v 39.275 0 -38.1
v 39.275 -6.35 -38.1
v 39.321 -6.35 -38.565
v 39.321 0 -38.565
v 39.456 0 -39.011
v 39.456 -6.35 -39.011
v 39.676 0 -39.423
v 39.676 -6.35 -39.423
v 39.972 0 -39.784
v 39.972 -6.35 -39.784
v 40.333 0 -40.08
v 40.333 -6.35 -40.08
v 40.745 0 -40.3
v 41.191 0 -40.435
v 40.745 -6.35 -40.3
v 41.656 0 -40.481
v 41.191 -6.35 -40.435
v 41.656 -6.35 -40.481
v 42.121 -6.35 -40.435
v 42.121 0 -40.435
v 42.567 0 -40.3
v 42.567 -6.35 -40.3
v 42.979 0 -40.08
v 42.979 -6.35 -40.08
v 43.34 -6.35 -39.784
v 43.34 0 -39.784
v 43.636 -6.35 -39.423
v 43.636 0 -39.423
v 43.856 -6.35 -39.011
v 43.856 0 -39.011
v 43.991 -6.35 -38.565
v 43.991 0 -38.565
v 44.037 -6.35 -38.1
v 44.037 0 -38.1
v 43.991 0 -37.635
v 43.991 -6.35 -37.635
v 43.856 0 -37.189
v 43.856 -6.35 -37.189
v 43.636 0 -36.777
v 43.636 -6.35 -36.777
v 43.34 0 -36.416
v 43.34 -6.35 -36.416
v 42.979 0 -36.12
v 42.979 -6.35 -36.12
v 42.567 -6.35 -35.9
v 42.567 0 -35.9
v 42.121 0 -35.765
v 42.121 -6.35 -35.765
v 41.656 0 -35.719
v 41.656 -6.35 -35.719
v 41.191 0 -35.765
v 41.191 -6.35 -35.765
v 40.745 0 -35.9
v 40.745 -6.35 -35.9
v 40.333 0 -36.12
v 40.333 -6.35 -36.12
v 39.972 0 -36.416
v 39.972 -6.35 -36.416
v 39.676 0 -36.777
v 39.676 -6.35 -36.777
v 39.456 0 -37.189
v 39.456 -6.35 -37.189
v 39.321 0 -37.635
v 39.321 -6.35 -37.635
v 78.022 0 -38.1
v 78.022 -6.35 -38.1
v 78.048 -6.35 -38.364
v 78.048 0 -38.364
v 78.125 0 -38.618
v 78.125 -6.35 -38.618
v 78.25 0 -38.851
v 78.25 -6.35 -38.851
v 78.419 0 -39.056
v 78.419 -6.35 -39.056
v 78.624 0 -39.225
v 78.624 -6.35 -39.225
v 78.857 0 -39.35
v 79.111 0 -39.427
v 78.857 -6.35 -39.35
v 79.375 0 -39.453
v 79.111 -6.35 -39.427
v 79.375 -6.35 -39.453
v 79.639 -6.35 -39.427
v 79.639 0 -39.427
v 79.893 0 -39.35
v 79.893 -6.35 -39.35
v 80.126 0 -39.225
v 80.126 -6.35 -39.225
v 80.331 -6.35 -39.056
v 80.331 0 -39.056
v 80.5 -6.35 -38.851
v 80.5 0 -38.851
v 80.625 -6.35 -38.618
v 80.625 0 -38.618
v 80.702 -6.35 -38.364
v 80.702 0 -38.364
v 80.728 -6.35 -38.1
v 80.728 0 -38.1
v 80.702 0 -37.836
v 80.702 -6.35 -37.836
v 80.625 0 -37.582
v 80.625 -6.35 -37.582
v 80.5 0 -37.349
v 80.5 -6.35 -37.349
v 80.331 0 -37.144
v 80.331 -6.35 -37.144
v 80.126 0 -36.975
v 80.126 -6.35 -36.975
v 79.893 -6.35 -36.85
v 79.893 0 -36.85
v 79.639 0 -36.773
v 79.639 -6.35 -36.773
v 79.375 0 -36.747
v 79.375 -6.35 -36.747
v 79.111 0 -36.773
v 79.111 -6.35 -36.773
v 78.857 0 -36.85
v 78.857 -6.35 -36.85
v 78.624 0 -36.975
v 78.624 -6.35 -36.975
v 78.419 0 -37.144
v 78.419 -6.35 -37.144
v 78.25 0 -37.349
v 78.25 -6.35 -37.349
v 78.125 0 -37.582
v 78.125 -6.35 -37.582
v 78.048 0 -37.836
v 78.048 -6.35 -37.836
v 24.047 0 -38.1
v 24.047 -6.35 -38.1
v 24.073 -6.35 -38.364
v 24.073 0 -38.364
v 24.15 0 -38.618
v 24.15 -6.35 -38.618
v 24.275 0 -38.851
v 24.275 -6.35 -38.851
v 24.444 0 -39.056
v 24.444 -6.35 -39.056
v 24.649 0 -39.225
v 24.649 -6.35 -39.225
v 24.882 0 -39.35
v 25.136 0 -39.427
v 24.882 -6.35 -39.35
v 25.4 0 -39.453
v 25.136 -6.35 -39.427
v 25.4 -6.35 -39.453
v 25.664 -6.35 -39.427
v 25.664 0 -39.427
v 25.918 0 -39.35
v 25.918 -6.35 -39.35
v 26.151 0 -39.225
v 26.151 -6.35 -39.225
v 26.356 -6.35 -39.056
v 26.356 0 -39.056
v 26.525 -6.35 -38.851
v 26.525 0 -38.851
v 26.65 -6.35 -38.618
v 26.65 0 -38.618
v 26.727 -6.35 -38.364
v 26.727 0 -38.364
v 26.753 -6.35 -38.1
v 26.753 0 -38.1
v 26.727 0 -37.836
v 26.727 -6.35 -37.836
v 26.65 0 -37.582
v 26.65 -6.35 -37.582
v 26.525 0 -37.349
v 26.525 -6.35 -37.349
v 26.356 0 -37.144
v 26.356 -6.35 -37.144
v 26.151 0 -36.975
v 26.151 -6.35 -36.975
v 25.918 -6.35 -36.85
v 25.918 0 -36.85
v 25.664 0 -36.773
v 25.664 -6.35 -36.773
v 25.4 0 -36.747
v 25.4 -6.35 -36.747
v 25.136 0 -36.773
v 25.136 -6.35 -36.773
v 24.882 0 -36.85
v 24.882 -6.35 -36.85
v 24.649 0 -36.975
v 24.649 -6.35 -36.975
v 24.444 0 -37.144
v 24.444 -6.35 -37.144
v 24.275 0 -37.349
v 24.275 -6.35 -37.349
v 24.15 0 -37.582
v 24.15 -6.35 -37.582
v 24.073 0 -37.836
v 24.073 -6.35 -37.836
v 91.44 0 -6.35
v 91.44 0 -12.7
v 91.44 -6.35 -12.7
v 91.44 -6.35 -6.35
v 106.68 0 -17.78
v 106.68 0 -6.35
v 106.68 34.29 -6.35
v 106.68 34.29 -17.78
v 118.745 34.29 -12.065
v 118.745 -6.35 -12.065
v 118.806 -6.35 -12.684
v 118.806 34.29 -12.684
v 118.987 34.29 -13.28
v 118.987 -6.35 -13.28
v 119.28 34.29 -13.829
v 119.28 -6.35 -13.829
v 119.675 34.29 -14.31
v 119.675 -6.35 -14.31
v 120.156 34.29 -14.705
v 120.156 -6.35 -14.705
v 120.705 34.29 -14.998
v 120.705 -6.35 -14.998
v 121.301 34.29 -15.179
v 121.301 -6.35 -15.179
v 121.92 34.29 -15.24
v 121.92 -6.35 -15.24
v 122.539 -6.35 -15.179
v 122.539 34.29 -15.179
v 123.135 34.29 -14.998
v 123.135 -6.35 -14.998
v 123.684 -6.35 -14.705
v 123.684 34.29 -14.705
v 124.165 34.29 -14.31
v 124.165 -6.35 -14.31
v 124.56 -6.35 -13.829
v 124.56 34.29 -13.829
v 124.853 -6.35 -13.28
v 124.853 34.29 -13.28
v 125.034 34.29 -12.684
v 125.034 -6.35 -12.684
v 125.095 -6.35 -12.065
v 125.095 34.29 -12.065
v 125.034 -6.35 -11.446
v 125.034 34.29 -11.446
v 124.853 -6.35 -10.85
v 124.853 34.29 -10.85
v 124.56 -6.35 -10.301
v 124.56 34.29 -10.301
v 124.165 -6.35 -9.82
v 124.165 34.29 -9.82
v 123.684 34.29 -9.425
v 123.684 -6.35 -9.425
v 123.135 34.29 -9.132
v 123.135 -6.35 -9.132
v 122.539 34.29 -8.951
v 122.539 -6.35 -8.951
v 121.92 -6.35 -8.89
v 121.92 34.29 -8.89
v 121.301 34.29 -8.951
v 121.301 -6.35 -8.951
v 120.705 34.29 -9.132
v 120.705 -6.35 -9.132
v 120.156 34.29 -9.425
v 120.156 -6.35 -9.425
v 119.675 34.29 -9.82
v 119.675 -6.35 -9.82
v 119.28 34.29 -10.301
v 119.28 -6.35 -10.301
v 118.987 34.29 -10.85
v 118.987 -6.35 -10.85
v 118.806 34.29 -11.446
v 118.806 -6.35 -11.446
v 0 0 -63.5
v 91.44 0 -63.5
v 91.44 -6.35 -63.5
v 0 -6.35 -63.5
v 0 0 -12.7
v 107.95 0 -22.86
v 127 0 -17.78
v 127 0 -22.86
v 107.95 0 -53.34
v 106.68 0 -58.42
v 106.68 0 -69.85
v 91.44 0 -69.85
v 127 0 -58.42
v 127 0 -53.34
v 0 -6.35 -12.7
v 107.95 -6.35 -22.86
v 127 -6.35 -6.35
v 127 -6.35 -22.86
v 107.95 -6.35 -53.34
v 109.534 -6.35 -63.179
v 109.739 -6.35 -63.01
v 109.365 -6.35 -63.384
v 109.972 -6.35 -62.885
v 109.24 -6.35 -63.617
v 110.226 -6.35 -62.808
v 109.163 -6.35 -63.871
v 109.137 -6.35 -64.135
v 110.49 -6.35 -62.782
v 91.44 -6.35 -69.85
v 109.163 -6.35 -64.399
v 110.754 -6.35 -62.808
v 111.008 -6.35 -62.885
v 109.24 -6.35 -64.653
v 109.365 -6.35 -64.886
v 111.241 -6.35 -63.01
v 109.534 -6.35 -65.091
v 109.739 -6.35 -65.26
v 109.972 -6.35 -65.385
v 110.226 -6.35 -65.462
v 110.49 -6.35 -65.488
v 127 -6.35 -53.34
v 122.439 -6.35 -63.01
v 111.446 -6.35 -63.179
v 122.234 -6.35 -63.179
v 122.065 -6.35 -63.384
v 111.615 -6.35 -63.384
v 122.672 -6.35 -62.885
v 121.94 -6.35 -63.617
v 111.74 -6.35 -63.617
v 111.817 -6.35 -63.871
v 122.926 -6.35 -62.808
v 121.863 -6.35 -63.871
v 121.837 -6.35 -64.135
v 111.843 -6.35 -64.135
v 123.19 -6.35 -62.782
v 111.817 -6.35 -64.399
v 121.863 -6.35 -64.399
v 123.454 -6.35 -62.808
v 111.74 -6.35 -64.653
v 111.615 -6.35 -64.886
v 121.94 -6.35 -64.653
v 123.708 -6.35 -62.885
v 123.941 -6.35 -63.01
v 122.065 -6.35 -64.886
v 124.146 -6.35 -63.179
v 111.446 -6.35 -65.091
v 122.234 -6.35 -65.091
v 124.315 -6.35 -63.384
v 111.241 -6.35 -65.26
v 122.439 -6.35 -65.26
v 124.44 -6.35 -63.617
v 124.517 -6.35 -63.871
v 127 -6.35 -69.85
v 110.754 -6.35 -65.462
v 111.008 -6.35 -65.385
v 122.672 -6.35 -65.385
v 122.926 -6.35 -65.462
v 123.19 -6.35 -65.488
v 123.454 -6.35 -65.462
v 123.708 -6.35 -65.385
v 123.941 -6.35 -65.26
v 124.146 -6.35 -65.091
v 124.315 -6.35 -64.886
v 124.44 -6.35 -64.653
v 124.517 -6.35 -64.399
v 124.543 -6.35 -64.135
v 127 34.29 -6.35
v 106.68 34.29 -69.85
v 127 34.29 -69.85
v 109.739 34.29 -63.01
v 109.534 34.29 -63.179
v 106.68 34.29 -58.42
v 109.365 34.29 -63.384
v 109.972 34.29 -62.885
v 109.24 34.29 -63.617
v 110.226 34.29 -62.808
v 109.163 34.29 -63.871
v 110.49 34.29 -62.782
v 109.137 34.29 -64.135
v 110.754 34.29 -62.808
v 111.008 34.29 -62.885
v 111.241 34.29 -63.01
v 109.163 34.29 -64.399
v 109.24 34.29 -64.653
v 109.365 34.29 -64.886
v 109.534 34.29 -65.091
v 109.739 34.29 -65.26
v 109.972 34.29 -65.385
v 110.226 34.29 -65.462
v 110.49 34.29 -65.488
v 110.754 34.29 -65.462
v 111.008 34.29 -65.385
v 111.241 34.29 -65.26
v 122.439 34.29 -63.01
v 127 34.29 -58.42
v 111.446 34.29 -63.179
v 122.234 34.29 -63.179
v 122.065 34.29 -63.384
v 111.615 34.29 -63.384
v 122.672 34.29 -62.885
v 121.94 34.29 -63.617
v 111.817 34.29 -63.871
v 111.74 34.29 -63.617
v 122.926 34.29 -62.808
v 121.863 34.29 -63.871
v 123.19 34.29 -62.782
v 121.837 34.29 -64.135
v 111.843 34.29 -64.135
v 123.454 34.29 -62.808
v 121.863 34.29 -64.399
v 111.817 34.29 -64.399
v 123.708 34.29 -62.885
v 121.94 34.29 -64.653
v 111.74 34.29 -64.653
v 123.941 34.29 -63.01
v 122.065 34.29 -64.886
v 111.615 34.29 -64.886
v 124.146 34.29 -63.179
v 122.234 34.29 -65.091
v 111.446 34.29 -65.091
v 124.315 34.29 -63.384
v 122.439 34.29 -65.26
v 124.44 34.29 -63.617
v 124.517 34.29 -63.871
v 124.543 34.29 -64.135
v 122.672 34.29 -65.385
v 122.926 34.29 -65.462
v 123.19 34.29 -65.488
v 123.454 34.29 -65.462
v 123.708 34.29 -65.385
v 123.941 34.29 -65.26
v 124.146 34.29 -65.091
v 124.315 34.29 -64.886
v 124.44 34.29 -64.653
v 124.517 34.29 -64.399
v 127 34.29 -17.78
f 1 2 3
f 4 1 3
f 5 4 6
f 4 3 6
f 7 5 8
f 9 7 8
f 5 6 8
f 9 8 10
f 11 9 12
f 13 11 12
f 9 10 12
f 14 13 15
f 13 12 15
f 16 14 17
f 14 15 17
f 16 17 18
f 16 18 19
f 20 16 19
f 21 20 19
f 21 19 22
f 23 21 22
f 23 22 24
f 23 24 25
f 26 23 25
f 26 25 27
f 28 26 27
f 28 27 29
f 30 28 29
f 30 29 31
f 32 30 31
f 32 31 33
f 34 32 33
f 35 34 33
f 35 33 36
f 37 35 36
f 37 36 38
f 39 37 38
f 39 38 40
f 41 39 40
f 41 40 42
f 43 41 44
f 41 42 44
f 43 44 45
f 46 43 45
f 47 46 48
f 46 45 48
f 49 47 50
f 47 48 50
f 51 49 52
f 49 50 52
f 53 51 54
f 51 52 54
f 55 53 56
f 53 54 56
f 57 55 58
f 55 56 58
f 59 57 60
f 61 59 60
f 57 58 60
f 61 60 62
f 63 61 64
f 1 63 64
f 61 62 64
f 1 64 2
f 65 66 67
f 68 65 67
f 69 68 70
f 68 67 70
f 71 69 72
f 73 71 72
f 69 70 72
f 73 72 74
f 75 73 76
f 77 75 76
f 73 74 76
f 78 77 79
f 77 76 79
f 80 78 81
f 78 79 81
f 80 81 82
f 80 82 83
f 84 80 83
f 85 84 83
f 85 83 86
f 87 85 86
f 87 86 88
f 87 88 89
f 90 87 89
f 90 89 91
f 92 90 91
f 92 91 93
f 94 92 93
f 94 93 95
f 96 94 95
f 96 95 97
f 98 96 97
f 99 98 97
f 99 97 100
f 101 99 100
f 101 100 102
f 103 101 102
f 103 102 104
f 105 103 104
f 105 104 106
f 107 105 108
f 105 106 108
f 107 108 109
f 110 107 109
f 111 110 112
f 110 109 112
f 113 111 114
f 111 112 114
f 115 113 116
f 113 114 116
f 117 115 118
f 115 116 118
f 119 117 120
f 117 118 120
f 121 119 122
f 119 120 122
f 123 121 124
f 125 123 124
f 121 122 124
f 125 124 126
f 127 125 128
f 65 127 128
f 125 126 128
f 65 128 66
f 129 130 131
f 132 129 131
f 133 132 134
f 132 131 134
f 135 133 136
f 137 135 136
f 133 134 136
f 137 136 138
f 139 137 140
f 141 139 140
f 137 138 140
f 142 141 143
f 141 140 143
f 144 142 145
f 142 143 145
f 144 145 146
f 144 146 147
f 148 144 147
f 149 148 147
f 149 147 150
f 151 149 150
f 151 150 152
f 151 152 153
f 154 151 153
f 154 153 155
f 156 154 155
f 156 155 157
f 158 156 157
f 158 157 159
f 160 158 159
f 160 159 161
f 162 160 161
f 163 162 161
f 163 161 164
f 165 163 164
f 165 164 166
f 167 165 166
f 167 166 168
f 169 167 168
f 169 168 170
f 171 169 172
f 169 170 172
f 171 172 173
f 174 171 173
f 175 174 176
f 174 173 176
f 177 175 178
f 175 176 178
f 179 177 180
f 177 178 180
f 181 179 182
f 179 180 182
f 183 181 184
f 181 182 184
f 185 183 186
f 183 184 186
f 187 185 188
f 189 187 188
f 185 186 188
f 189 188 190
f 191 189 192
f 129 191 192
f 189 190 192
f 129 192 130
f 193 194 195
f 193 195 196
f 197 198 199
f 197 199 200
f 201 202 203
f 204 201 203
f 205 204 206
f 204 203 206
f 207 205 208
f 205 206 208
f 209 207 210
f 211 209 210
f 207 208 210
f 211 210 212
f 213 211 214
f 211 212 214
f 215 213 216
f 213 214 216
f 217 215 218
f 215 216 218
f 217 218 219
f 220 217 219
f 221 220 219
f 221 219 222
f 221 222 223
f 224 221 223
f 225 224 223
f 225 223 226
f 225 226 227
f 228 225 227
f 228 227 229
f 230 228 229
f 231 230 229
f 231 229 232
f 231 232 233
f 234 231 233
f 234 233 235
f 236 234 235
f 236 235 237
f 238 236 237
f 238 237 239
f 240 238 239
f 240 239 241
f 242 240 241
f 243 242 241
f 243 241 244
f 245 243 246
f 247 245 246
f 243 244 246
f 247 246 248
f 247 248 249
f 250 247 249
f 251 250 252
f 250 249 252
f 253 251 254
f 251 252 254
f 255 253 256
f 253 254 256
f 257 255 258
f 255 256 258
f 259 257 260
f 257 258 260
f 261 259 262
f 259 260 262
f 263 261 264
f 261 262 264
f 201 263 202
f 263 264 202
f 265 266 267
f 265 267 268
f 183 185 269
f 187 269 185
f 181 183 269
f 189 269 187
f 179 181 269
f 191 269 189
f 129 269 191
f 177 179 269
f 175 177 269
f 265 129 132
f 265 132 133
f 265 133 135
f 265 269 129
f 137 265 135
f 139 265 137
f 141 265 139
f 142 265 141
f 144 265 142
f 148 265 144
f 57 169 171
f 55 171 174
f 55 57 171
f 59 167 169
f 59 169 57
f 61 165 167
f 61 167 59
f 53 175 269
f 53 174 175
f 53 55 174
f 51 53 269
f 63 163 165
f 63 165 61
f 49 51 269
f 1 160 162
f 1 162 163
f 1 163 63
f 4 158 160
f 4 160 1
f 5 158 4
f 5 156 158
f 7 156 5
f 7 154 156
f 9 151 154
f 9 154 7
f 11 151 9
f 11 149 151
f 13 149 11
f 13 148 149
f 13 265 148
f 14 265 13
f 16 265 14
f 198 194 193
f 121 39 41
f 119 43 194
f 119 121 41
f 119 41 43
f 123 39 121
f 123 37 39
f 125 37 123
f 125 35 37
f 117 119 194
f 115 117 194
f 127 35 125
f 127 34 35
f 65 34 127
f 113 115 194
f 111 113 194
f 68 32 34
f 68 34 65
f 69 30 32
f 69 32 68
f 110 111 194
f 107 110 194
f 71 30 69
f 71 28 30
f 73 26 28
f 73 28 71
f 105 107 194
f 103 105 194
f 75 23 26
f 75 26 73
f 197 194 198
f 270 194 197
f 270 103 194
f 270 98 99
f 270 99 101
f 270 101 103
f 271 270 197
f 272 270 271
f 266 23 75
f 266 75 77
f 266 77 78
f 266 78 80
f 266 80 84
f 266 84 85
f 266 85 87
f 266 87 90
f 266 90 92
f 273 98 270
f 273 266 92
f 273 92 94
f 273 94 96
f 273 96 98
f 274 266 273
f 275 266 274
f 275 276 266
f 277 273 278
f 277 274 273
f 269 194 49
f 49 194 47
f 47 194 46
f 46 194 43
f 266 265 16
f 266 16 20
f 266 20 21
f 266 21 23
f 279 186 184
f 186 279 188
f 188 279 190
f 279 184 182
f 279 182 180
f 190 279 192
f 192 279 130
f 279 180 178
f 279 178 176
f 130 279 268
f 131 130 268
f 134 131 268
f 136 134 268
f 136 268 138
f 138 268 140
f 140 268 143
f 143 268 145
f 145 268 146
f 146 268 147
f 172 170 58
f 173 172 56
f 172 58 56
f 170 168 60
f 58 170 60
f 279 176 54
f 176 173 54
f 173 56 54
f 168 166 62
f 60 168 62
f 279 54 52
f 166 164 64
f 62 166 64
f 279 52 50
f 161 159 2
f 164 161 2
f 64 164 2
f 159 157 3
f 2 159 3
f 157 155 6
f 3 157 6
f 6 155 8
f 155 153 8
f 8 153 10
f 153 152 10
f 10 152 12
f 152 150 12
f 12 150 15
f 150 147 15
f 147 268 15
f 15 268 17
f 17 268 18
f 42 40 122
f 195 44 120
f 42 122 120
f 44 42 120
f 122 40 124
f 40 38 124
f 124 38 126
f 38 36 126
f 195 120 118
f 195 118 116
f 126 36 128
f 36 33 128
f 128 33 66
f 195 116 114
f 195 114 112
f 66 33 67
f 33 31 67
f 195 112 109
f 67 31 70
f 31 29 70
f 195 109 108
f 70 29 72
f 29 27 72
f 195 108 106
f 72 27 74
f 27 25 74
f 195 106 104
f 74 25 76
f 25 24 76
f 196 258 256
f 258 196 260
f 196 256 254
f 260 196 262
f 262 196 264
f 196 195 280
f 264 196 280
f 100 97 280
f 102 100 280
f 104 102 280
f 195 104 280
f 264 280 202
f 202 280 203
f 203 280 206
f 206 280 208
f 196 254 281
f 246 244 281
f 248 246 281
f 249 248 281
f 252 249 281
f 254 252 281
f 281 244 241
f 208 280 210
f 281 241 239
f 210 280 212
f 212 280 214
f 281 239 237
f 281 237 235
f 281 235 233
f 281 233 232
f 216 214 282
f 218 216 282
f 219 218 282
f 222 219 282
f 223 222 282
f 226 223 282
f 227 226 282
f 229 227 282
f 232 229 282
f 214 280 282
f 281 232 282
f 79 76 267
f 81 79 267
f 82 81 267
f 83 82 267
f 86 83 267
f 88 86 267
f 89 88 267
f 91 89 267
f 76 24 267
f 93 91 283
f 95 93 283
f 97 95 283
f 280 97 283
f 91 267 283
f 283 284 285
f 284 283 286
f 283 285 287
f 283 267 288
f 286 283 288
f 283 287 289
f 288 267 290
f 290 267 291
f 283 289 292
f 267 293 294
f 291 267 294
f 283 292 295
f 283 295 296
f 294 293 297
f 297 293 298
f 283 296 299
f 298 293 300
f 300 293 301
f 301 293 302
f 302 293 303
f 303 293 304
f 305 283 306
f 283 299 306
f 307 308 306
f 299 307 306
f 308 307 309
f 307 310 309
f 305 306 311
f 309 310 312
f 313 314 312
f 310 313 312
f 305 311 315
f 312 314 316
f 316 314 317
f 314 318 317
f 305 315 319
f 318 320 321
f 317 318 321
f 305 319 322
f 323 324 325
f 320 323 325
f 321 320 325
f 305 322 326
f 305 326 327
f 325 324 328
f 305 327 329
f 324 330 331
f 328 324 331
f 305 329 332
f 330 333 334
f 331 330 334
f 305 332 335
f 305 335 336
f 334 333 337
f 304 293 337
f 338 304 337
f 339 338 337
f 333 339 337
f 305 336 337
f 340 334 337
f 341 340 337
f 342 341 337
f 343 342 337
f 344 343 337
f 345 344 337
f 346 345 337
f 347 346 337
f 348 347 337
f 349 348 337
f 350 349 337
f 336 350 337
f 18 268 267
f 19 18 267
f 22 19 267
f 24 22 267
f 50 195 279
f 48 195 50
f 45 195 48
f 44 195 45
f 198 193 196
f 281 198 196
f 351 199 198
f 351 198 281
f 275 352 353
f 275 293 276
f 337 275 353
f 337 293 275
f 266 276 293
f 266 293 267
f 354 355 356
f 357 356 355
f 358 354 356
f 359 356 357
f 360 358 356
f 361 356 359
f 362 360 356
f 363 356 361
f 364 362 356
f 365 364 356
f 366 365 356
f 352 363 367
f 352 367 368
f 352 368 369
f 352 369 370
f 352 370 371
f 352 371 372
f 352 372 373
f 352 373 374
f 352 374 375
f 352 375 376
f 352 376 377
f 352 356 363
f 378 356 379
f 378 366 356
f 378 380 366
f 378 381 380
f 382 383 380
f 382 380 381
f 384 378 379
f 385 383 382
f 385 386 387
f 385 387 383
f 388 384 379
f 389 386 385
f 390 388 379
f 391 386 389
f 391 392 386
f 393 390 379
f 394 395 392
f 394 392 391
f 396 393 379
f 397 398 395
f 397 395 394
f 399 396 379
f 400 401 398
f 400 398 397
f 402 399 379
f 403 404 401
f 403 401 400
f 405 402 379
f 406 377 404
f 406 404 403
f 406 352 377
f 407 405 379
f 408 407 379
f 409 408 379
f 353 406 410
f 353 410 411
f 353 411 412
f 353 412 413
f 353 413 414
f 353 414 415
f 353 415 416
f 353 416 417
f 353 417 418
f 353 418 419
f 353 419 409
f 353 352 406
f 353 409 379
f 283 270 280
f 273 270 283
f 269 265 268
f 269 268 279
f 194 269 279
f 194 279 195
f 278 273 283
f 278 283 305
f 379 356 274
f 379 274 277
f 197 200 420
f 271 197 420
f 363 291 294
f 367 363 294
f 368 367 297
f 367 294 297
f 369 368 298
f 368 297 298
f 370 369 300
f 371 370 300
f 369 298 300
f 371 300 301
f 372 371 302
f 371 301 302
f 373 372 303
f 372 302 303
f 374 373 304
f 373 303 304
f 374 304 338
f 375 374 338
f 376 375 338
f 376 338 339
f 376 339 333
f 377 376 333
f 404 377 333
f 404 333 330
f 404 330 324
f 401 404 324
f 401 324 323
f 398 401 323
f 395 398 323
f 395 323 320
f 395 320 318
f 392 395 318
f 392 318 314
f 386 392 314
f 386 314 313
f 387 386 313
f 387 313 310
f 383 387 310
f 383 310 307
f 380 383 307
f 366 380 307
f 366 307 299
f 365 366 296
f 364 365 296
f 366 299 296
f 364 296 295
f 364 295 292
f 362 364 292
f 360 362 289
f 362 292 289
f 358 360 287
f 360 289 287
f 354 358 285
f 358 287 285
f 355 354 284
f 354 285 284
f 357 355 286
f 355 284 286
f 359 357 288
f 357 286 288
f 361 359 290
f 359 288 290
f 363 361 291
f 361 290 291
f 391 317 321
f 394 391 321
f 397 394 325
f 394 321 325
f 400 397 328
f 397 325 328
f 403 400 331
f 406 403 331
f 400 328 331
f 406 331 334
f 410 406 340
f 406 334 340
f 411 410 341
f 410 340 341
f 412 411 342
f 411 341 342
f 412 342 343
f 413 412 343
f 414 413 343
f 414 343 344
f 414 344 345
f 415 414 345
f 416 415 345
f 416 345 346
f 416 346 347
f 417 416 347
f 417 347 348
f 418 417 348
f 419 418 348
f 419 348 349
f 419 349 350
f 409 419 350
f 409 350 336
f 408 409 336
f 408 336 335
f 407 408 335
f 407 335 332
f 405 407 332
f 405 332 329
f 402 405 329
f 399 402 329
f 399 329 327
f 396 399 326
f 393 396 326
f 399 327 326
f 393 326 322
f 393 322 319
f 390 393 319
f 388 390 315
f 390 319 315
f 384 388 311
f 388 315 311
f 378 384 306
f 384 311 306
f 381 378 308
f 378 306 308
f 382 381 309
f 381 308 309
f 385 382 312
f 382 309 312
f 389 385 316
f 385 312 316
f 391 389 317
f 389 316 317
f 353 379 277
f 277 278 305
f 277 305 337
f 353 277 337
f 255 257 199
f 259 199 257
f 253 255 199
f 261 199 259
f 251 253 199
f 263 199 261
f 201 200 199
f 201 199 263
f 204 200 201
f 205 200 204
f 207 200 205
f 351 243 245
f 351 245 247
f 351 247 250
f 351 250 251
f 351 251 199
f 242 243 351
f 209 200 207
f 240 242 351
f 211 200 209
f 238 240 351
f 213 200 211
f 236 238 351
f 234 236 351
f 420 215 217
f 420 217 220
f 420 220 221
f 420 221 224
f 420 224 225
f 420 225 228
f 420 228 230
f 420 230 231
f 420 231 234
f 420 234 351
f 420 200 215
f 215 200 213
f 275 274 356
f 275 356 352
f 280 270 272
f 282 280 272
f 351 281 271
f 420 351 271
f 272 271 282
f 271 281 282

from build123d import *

# Parameters (mm, degrees)
BOSS_EXTRUDE3_DEPTH          = 6.35
SKETCH4_W                    = 20.32
SKETCH4_H                    = 11.43
BOSS_EXTRUDE4_DEPTH          = 34.29
SKETCH5_W                    = 19.05
SKETCH5_H                    = 30.48
CUT_EXTRUDE1_DEPTH           = 12.7
F_3_16_0_1875_DOWEL_HOLE4_D  = 4.7625
F_1_4_0_2500_DOWEL_HOLE1_D   = 6.35
F_36_0_1065_DIAMETER_HOLE1_D = 2.7051
F_6_32_TAPPED_HOLE1_D        = 2.7051


with BuildPart() as part:
    # Sketch2 → Boss-Extrude3 (new body)
    with BuildSketch(Plane(origin=(0, 0, 0), x_dir=(1, 0, 0), z_dir=(0, 1, 0))):
        Polygon((91.44, 6.35), (127, 6.35), (127, 69.85), (91.44, 69.85), (91.44, 63.5), (0, 63.5), (0, 12.7), (91.44, 12.7), align=None)
    extrude(amount=-BOSS_EXTRUDE3_DEPTH)

    # Sketch4 → Boss-Extrude4 (add)
    with BuildSketch(Plane(origin=(0, 0, 0), x_dir=(1, 0, 0), z_dir=(0, 1, 0))):
        with Locations((116.84, 64.135)):
            Rectangle(SKETCH4_W, SKETCH4_H)
        with Locations((116.84, 12.065)):
            Rectangle(SKETCH4_W, SKETCH4_H)
    extrude(amount=BOSS_EXTRUDE4_DEPTH)

    # Sketch5 → Cut-Extrude1 (cut)
    with BuildSketch(Plane(origin=(0, 0, 0), x_dir=(1, 0, 0), z_dir=(0, 1, 0))):
        with Locations((117.475, 38.1)):
            Rectangle(SKETCH5_W, SKETCH5_H)
    extrude(amount=-CUT_EXTRUDE1_DEPTH, mode=Mode.SUBTRACT)

    # 3/16 (0.1875) Dowel Hole4 (through all)
    with Locations(Plane(origin=(0, 0, 0), x_dir=(1, 0, 0), z_dir=(0, 1, 0))):
        with Locations((41.656, 38.1)):
            Hole(F_3_16_0_1875_DOWEL_HOLE4_D / 2)

    # 1/4 (0.2500) Dowel Hole1 (through all)
    with Locations(Plane(origin=(0, 34.29, 0), x_dir=(1, 0, 0), z_dir=(0, 1, 0))):
        with Locations((121.92, 12.065)):
            Hole(F_1_4_0_2500_DOWEL_HOLE1_D / 2)

    # #36 (0.1065) Diameter Hole1 (through all)
    with Locations(Plane(origin=(0, 0, 0), x_dir=(1, 0, 0), z_dir=(0, 1, 0))):
        with Locations((25.4, 38.1), (79.375, 38.1)):
            Hole(F_36_0_1065_DIAMETER_HOLE1_D / 2)

    # #6-32 Tapped Hole1 (through all)
    with Locations(Plane(origin=(0, 34.29, 0), x_dir=(1, 0, 0), z_dir=(0, 1, 0))):
        with Locations((123.19, 64.135), (110.49, 64.135)):
            Hole(F_6_32_TAPPED_HOLE1_D / 2)


solid = part.part
